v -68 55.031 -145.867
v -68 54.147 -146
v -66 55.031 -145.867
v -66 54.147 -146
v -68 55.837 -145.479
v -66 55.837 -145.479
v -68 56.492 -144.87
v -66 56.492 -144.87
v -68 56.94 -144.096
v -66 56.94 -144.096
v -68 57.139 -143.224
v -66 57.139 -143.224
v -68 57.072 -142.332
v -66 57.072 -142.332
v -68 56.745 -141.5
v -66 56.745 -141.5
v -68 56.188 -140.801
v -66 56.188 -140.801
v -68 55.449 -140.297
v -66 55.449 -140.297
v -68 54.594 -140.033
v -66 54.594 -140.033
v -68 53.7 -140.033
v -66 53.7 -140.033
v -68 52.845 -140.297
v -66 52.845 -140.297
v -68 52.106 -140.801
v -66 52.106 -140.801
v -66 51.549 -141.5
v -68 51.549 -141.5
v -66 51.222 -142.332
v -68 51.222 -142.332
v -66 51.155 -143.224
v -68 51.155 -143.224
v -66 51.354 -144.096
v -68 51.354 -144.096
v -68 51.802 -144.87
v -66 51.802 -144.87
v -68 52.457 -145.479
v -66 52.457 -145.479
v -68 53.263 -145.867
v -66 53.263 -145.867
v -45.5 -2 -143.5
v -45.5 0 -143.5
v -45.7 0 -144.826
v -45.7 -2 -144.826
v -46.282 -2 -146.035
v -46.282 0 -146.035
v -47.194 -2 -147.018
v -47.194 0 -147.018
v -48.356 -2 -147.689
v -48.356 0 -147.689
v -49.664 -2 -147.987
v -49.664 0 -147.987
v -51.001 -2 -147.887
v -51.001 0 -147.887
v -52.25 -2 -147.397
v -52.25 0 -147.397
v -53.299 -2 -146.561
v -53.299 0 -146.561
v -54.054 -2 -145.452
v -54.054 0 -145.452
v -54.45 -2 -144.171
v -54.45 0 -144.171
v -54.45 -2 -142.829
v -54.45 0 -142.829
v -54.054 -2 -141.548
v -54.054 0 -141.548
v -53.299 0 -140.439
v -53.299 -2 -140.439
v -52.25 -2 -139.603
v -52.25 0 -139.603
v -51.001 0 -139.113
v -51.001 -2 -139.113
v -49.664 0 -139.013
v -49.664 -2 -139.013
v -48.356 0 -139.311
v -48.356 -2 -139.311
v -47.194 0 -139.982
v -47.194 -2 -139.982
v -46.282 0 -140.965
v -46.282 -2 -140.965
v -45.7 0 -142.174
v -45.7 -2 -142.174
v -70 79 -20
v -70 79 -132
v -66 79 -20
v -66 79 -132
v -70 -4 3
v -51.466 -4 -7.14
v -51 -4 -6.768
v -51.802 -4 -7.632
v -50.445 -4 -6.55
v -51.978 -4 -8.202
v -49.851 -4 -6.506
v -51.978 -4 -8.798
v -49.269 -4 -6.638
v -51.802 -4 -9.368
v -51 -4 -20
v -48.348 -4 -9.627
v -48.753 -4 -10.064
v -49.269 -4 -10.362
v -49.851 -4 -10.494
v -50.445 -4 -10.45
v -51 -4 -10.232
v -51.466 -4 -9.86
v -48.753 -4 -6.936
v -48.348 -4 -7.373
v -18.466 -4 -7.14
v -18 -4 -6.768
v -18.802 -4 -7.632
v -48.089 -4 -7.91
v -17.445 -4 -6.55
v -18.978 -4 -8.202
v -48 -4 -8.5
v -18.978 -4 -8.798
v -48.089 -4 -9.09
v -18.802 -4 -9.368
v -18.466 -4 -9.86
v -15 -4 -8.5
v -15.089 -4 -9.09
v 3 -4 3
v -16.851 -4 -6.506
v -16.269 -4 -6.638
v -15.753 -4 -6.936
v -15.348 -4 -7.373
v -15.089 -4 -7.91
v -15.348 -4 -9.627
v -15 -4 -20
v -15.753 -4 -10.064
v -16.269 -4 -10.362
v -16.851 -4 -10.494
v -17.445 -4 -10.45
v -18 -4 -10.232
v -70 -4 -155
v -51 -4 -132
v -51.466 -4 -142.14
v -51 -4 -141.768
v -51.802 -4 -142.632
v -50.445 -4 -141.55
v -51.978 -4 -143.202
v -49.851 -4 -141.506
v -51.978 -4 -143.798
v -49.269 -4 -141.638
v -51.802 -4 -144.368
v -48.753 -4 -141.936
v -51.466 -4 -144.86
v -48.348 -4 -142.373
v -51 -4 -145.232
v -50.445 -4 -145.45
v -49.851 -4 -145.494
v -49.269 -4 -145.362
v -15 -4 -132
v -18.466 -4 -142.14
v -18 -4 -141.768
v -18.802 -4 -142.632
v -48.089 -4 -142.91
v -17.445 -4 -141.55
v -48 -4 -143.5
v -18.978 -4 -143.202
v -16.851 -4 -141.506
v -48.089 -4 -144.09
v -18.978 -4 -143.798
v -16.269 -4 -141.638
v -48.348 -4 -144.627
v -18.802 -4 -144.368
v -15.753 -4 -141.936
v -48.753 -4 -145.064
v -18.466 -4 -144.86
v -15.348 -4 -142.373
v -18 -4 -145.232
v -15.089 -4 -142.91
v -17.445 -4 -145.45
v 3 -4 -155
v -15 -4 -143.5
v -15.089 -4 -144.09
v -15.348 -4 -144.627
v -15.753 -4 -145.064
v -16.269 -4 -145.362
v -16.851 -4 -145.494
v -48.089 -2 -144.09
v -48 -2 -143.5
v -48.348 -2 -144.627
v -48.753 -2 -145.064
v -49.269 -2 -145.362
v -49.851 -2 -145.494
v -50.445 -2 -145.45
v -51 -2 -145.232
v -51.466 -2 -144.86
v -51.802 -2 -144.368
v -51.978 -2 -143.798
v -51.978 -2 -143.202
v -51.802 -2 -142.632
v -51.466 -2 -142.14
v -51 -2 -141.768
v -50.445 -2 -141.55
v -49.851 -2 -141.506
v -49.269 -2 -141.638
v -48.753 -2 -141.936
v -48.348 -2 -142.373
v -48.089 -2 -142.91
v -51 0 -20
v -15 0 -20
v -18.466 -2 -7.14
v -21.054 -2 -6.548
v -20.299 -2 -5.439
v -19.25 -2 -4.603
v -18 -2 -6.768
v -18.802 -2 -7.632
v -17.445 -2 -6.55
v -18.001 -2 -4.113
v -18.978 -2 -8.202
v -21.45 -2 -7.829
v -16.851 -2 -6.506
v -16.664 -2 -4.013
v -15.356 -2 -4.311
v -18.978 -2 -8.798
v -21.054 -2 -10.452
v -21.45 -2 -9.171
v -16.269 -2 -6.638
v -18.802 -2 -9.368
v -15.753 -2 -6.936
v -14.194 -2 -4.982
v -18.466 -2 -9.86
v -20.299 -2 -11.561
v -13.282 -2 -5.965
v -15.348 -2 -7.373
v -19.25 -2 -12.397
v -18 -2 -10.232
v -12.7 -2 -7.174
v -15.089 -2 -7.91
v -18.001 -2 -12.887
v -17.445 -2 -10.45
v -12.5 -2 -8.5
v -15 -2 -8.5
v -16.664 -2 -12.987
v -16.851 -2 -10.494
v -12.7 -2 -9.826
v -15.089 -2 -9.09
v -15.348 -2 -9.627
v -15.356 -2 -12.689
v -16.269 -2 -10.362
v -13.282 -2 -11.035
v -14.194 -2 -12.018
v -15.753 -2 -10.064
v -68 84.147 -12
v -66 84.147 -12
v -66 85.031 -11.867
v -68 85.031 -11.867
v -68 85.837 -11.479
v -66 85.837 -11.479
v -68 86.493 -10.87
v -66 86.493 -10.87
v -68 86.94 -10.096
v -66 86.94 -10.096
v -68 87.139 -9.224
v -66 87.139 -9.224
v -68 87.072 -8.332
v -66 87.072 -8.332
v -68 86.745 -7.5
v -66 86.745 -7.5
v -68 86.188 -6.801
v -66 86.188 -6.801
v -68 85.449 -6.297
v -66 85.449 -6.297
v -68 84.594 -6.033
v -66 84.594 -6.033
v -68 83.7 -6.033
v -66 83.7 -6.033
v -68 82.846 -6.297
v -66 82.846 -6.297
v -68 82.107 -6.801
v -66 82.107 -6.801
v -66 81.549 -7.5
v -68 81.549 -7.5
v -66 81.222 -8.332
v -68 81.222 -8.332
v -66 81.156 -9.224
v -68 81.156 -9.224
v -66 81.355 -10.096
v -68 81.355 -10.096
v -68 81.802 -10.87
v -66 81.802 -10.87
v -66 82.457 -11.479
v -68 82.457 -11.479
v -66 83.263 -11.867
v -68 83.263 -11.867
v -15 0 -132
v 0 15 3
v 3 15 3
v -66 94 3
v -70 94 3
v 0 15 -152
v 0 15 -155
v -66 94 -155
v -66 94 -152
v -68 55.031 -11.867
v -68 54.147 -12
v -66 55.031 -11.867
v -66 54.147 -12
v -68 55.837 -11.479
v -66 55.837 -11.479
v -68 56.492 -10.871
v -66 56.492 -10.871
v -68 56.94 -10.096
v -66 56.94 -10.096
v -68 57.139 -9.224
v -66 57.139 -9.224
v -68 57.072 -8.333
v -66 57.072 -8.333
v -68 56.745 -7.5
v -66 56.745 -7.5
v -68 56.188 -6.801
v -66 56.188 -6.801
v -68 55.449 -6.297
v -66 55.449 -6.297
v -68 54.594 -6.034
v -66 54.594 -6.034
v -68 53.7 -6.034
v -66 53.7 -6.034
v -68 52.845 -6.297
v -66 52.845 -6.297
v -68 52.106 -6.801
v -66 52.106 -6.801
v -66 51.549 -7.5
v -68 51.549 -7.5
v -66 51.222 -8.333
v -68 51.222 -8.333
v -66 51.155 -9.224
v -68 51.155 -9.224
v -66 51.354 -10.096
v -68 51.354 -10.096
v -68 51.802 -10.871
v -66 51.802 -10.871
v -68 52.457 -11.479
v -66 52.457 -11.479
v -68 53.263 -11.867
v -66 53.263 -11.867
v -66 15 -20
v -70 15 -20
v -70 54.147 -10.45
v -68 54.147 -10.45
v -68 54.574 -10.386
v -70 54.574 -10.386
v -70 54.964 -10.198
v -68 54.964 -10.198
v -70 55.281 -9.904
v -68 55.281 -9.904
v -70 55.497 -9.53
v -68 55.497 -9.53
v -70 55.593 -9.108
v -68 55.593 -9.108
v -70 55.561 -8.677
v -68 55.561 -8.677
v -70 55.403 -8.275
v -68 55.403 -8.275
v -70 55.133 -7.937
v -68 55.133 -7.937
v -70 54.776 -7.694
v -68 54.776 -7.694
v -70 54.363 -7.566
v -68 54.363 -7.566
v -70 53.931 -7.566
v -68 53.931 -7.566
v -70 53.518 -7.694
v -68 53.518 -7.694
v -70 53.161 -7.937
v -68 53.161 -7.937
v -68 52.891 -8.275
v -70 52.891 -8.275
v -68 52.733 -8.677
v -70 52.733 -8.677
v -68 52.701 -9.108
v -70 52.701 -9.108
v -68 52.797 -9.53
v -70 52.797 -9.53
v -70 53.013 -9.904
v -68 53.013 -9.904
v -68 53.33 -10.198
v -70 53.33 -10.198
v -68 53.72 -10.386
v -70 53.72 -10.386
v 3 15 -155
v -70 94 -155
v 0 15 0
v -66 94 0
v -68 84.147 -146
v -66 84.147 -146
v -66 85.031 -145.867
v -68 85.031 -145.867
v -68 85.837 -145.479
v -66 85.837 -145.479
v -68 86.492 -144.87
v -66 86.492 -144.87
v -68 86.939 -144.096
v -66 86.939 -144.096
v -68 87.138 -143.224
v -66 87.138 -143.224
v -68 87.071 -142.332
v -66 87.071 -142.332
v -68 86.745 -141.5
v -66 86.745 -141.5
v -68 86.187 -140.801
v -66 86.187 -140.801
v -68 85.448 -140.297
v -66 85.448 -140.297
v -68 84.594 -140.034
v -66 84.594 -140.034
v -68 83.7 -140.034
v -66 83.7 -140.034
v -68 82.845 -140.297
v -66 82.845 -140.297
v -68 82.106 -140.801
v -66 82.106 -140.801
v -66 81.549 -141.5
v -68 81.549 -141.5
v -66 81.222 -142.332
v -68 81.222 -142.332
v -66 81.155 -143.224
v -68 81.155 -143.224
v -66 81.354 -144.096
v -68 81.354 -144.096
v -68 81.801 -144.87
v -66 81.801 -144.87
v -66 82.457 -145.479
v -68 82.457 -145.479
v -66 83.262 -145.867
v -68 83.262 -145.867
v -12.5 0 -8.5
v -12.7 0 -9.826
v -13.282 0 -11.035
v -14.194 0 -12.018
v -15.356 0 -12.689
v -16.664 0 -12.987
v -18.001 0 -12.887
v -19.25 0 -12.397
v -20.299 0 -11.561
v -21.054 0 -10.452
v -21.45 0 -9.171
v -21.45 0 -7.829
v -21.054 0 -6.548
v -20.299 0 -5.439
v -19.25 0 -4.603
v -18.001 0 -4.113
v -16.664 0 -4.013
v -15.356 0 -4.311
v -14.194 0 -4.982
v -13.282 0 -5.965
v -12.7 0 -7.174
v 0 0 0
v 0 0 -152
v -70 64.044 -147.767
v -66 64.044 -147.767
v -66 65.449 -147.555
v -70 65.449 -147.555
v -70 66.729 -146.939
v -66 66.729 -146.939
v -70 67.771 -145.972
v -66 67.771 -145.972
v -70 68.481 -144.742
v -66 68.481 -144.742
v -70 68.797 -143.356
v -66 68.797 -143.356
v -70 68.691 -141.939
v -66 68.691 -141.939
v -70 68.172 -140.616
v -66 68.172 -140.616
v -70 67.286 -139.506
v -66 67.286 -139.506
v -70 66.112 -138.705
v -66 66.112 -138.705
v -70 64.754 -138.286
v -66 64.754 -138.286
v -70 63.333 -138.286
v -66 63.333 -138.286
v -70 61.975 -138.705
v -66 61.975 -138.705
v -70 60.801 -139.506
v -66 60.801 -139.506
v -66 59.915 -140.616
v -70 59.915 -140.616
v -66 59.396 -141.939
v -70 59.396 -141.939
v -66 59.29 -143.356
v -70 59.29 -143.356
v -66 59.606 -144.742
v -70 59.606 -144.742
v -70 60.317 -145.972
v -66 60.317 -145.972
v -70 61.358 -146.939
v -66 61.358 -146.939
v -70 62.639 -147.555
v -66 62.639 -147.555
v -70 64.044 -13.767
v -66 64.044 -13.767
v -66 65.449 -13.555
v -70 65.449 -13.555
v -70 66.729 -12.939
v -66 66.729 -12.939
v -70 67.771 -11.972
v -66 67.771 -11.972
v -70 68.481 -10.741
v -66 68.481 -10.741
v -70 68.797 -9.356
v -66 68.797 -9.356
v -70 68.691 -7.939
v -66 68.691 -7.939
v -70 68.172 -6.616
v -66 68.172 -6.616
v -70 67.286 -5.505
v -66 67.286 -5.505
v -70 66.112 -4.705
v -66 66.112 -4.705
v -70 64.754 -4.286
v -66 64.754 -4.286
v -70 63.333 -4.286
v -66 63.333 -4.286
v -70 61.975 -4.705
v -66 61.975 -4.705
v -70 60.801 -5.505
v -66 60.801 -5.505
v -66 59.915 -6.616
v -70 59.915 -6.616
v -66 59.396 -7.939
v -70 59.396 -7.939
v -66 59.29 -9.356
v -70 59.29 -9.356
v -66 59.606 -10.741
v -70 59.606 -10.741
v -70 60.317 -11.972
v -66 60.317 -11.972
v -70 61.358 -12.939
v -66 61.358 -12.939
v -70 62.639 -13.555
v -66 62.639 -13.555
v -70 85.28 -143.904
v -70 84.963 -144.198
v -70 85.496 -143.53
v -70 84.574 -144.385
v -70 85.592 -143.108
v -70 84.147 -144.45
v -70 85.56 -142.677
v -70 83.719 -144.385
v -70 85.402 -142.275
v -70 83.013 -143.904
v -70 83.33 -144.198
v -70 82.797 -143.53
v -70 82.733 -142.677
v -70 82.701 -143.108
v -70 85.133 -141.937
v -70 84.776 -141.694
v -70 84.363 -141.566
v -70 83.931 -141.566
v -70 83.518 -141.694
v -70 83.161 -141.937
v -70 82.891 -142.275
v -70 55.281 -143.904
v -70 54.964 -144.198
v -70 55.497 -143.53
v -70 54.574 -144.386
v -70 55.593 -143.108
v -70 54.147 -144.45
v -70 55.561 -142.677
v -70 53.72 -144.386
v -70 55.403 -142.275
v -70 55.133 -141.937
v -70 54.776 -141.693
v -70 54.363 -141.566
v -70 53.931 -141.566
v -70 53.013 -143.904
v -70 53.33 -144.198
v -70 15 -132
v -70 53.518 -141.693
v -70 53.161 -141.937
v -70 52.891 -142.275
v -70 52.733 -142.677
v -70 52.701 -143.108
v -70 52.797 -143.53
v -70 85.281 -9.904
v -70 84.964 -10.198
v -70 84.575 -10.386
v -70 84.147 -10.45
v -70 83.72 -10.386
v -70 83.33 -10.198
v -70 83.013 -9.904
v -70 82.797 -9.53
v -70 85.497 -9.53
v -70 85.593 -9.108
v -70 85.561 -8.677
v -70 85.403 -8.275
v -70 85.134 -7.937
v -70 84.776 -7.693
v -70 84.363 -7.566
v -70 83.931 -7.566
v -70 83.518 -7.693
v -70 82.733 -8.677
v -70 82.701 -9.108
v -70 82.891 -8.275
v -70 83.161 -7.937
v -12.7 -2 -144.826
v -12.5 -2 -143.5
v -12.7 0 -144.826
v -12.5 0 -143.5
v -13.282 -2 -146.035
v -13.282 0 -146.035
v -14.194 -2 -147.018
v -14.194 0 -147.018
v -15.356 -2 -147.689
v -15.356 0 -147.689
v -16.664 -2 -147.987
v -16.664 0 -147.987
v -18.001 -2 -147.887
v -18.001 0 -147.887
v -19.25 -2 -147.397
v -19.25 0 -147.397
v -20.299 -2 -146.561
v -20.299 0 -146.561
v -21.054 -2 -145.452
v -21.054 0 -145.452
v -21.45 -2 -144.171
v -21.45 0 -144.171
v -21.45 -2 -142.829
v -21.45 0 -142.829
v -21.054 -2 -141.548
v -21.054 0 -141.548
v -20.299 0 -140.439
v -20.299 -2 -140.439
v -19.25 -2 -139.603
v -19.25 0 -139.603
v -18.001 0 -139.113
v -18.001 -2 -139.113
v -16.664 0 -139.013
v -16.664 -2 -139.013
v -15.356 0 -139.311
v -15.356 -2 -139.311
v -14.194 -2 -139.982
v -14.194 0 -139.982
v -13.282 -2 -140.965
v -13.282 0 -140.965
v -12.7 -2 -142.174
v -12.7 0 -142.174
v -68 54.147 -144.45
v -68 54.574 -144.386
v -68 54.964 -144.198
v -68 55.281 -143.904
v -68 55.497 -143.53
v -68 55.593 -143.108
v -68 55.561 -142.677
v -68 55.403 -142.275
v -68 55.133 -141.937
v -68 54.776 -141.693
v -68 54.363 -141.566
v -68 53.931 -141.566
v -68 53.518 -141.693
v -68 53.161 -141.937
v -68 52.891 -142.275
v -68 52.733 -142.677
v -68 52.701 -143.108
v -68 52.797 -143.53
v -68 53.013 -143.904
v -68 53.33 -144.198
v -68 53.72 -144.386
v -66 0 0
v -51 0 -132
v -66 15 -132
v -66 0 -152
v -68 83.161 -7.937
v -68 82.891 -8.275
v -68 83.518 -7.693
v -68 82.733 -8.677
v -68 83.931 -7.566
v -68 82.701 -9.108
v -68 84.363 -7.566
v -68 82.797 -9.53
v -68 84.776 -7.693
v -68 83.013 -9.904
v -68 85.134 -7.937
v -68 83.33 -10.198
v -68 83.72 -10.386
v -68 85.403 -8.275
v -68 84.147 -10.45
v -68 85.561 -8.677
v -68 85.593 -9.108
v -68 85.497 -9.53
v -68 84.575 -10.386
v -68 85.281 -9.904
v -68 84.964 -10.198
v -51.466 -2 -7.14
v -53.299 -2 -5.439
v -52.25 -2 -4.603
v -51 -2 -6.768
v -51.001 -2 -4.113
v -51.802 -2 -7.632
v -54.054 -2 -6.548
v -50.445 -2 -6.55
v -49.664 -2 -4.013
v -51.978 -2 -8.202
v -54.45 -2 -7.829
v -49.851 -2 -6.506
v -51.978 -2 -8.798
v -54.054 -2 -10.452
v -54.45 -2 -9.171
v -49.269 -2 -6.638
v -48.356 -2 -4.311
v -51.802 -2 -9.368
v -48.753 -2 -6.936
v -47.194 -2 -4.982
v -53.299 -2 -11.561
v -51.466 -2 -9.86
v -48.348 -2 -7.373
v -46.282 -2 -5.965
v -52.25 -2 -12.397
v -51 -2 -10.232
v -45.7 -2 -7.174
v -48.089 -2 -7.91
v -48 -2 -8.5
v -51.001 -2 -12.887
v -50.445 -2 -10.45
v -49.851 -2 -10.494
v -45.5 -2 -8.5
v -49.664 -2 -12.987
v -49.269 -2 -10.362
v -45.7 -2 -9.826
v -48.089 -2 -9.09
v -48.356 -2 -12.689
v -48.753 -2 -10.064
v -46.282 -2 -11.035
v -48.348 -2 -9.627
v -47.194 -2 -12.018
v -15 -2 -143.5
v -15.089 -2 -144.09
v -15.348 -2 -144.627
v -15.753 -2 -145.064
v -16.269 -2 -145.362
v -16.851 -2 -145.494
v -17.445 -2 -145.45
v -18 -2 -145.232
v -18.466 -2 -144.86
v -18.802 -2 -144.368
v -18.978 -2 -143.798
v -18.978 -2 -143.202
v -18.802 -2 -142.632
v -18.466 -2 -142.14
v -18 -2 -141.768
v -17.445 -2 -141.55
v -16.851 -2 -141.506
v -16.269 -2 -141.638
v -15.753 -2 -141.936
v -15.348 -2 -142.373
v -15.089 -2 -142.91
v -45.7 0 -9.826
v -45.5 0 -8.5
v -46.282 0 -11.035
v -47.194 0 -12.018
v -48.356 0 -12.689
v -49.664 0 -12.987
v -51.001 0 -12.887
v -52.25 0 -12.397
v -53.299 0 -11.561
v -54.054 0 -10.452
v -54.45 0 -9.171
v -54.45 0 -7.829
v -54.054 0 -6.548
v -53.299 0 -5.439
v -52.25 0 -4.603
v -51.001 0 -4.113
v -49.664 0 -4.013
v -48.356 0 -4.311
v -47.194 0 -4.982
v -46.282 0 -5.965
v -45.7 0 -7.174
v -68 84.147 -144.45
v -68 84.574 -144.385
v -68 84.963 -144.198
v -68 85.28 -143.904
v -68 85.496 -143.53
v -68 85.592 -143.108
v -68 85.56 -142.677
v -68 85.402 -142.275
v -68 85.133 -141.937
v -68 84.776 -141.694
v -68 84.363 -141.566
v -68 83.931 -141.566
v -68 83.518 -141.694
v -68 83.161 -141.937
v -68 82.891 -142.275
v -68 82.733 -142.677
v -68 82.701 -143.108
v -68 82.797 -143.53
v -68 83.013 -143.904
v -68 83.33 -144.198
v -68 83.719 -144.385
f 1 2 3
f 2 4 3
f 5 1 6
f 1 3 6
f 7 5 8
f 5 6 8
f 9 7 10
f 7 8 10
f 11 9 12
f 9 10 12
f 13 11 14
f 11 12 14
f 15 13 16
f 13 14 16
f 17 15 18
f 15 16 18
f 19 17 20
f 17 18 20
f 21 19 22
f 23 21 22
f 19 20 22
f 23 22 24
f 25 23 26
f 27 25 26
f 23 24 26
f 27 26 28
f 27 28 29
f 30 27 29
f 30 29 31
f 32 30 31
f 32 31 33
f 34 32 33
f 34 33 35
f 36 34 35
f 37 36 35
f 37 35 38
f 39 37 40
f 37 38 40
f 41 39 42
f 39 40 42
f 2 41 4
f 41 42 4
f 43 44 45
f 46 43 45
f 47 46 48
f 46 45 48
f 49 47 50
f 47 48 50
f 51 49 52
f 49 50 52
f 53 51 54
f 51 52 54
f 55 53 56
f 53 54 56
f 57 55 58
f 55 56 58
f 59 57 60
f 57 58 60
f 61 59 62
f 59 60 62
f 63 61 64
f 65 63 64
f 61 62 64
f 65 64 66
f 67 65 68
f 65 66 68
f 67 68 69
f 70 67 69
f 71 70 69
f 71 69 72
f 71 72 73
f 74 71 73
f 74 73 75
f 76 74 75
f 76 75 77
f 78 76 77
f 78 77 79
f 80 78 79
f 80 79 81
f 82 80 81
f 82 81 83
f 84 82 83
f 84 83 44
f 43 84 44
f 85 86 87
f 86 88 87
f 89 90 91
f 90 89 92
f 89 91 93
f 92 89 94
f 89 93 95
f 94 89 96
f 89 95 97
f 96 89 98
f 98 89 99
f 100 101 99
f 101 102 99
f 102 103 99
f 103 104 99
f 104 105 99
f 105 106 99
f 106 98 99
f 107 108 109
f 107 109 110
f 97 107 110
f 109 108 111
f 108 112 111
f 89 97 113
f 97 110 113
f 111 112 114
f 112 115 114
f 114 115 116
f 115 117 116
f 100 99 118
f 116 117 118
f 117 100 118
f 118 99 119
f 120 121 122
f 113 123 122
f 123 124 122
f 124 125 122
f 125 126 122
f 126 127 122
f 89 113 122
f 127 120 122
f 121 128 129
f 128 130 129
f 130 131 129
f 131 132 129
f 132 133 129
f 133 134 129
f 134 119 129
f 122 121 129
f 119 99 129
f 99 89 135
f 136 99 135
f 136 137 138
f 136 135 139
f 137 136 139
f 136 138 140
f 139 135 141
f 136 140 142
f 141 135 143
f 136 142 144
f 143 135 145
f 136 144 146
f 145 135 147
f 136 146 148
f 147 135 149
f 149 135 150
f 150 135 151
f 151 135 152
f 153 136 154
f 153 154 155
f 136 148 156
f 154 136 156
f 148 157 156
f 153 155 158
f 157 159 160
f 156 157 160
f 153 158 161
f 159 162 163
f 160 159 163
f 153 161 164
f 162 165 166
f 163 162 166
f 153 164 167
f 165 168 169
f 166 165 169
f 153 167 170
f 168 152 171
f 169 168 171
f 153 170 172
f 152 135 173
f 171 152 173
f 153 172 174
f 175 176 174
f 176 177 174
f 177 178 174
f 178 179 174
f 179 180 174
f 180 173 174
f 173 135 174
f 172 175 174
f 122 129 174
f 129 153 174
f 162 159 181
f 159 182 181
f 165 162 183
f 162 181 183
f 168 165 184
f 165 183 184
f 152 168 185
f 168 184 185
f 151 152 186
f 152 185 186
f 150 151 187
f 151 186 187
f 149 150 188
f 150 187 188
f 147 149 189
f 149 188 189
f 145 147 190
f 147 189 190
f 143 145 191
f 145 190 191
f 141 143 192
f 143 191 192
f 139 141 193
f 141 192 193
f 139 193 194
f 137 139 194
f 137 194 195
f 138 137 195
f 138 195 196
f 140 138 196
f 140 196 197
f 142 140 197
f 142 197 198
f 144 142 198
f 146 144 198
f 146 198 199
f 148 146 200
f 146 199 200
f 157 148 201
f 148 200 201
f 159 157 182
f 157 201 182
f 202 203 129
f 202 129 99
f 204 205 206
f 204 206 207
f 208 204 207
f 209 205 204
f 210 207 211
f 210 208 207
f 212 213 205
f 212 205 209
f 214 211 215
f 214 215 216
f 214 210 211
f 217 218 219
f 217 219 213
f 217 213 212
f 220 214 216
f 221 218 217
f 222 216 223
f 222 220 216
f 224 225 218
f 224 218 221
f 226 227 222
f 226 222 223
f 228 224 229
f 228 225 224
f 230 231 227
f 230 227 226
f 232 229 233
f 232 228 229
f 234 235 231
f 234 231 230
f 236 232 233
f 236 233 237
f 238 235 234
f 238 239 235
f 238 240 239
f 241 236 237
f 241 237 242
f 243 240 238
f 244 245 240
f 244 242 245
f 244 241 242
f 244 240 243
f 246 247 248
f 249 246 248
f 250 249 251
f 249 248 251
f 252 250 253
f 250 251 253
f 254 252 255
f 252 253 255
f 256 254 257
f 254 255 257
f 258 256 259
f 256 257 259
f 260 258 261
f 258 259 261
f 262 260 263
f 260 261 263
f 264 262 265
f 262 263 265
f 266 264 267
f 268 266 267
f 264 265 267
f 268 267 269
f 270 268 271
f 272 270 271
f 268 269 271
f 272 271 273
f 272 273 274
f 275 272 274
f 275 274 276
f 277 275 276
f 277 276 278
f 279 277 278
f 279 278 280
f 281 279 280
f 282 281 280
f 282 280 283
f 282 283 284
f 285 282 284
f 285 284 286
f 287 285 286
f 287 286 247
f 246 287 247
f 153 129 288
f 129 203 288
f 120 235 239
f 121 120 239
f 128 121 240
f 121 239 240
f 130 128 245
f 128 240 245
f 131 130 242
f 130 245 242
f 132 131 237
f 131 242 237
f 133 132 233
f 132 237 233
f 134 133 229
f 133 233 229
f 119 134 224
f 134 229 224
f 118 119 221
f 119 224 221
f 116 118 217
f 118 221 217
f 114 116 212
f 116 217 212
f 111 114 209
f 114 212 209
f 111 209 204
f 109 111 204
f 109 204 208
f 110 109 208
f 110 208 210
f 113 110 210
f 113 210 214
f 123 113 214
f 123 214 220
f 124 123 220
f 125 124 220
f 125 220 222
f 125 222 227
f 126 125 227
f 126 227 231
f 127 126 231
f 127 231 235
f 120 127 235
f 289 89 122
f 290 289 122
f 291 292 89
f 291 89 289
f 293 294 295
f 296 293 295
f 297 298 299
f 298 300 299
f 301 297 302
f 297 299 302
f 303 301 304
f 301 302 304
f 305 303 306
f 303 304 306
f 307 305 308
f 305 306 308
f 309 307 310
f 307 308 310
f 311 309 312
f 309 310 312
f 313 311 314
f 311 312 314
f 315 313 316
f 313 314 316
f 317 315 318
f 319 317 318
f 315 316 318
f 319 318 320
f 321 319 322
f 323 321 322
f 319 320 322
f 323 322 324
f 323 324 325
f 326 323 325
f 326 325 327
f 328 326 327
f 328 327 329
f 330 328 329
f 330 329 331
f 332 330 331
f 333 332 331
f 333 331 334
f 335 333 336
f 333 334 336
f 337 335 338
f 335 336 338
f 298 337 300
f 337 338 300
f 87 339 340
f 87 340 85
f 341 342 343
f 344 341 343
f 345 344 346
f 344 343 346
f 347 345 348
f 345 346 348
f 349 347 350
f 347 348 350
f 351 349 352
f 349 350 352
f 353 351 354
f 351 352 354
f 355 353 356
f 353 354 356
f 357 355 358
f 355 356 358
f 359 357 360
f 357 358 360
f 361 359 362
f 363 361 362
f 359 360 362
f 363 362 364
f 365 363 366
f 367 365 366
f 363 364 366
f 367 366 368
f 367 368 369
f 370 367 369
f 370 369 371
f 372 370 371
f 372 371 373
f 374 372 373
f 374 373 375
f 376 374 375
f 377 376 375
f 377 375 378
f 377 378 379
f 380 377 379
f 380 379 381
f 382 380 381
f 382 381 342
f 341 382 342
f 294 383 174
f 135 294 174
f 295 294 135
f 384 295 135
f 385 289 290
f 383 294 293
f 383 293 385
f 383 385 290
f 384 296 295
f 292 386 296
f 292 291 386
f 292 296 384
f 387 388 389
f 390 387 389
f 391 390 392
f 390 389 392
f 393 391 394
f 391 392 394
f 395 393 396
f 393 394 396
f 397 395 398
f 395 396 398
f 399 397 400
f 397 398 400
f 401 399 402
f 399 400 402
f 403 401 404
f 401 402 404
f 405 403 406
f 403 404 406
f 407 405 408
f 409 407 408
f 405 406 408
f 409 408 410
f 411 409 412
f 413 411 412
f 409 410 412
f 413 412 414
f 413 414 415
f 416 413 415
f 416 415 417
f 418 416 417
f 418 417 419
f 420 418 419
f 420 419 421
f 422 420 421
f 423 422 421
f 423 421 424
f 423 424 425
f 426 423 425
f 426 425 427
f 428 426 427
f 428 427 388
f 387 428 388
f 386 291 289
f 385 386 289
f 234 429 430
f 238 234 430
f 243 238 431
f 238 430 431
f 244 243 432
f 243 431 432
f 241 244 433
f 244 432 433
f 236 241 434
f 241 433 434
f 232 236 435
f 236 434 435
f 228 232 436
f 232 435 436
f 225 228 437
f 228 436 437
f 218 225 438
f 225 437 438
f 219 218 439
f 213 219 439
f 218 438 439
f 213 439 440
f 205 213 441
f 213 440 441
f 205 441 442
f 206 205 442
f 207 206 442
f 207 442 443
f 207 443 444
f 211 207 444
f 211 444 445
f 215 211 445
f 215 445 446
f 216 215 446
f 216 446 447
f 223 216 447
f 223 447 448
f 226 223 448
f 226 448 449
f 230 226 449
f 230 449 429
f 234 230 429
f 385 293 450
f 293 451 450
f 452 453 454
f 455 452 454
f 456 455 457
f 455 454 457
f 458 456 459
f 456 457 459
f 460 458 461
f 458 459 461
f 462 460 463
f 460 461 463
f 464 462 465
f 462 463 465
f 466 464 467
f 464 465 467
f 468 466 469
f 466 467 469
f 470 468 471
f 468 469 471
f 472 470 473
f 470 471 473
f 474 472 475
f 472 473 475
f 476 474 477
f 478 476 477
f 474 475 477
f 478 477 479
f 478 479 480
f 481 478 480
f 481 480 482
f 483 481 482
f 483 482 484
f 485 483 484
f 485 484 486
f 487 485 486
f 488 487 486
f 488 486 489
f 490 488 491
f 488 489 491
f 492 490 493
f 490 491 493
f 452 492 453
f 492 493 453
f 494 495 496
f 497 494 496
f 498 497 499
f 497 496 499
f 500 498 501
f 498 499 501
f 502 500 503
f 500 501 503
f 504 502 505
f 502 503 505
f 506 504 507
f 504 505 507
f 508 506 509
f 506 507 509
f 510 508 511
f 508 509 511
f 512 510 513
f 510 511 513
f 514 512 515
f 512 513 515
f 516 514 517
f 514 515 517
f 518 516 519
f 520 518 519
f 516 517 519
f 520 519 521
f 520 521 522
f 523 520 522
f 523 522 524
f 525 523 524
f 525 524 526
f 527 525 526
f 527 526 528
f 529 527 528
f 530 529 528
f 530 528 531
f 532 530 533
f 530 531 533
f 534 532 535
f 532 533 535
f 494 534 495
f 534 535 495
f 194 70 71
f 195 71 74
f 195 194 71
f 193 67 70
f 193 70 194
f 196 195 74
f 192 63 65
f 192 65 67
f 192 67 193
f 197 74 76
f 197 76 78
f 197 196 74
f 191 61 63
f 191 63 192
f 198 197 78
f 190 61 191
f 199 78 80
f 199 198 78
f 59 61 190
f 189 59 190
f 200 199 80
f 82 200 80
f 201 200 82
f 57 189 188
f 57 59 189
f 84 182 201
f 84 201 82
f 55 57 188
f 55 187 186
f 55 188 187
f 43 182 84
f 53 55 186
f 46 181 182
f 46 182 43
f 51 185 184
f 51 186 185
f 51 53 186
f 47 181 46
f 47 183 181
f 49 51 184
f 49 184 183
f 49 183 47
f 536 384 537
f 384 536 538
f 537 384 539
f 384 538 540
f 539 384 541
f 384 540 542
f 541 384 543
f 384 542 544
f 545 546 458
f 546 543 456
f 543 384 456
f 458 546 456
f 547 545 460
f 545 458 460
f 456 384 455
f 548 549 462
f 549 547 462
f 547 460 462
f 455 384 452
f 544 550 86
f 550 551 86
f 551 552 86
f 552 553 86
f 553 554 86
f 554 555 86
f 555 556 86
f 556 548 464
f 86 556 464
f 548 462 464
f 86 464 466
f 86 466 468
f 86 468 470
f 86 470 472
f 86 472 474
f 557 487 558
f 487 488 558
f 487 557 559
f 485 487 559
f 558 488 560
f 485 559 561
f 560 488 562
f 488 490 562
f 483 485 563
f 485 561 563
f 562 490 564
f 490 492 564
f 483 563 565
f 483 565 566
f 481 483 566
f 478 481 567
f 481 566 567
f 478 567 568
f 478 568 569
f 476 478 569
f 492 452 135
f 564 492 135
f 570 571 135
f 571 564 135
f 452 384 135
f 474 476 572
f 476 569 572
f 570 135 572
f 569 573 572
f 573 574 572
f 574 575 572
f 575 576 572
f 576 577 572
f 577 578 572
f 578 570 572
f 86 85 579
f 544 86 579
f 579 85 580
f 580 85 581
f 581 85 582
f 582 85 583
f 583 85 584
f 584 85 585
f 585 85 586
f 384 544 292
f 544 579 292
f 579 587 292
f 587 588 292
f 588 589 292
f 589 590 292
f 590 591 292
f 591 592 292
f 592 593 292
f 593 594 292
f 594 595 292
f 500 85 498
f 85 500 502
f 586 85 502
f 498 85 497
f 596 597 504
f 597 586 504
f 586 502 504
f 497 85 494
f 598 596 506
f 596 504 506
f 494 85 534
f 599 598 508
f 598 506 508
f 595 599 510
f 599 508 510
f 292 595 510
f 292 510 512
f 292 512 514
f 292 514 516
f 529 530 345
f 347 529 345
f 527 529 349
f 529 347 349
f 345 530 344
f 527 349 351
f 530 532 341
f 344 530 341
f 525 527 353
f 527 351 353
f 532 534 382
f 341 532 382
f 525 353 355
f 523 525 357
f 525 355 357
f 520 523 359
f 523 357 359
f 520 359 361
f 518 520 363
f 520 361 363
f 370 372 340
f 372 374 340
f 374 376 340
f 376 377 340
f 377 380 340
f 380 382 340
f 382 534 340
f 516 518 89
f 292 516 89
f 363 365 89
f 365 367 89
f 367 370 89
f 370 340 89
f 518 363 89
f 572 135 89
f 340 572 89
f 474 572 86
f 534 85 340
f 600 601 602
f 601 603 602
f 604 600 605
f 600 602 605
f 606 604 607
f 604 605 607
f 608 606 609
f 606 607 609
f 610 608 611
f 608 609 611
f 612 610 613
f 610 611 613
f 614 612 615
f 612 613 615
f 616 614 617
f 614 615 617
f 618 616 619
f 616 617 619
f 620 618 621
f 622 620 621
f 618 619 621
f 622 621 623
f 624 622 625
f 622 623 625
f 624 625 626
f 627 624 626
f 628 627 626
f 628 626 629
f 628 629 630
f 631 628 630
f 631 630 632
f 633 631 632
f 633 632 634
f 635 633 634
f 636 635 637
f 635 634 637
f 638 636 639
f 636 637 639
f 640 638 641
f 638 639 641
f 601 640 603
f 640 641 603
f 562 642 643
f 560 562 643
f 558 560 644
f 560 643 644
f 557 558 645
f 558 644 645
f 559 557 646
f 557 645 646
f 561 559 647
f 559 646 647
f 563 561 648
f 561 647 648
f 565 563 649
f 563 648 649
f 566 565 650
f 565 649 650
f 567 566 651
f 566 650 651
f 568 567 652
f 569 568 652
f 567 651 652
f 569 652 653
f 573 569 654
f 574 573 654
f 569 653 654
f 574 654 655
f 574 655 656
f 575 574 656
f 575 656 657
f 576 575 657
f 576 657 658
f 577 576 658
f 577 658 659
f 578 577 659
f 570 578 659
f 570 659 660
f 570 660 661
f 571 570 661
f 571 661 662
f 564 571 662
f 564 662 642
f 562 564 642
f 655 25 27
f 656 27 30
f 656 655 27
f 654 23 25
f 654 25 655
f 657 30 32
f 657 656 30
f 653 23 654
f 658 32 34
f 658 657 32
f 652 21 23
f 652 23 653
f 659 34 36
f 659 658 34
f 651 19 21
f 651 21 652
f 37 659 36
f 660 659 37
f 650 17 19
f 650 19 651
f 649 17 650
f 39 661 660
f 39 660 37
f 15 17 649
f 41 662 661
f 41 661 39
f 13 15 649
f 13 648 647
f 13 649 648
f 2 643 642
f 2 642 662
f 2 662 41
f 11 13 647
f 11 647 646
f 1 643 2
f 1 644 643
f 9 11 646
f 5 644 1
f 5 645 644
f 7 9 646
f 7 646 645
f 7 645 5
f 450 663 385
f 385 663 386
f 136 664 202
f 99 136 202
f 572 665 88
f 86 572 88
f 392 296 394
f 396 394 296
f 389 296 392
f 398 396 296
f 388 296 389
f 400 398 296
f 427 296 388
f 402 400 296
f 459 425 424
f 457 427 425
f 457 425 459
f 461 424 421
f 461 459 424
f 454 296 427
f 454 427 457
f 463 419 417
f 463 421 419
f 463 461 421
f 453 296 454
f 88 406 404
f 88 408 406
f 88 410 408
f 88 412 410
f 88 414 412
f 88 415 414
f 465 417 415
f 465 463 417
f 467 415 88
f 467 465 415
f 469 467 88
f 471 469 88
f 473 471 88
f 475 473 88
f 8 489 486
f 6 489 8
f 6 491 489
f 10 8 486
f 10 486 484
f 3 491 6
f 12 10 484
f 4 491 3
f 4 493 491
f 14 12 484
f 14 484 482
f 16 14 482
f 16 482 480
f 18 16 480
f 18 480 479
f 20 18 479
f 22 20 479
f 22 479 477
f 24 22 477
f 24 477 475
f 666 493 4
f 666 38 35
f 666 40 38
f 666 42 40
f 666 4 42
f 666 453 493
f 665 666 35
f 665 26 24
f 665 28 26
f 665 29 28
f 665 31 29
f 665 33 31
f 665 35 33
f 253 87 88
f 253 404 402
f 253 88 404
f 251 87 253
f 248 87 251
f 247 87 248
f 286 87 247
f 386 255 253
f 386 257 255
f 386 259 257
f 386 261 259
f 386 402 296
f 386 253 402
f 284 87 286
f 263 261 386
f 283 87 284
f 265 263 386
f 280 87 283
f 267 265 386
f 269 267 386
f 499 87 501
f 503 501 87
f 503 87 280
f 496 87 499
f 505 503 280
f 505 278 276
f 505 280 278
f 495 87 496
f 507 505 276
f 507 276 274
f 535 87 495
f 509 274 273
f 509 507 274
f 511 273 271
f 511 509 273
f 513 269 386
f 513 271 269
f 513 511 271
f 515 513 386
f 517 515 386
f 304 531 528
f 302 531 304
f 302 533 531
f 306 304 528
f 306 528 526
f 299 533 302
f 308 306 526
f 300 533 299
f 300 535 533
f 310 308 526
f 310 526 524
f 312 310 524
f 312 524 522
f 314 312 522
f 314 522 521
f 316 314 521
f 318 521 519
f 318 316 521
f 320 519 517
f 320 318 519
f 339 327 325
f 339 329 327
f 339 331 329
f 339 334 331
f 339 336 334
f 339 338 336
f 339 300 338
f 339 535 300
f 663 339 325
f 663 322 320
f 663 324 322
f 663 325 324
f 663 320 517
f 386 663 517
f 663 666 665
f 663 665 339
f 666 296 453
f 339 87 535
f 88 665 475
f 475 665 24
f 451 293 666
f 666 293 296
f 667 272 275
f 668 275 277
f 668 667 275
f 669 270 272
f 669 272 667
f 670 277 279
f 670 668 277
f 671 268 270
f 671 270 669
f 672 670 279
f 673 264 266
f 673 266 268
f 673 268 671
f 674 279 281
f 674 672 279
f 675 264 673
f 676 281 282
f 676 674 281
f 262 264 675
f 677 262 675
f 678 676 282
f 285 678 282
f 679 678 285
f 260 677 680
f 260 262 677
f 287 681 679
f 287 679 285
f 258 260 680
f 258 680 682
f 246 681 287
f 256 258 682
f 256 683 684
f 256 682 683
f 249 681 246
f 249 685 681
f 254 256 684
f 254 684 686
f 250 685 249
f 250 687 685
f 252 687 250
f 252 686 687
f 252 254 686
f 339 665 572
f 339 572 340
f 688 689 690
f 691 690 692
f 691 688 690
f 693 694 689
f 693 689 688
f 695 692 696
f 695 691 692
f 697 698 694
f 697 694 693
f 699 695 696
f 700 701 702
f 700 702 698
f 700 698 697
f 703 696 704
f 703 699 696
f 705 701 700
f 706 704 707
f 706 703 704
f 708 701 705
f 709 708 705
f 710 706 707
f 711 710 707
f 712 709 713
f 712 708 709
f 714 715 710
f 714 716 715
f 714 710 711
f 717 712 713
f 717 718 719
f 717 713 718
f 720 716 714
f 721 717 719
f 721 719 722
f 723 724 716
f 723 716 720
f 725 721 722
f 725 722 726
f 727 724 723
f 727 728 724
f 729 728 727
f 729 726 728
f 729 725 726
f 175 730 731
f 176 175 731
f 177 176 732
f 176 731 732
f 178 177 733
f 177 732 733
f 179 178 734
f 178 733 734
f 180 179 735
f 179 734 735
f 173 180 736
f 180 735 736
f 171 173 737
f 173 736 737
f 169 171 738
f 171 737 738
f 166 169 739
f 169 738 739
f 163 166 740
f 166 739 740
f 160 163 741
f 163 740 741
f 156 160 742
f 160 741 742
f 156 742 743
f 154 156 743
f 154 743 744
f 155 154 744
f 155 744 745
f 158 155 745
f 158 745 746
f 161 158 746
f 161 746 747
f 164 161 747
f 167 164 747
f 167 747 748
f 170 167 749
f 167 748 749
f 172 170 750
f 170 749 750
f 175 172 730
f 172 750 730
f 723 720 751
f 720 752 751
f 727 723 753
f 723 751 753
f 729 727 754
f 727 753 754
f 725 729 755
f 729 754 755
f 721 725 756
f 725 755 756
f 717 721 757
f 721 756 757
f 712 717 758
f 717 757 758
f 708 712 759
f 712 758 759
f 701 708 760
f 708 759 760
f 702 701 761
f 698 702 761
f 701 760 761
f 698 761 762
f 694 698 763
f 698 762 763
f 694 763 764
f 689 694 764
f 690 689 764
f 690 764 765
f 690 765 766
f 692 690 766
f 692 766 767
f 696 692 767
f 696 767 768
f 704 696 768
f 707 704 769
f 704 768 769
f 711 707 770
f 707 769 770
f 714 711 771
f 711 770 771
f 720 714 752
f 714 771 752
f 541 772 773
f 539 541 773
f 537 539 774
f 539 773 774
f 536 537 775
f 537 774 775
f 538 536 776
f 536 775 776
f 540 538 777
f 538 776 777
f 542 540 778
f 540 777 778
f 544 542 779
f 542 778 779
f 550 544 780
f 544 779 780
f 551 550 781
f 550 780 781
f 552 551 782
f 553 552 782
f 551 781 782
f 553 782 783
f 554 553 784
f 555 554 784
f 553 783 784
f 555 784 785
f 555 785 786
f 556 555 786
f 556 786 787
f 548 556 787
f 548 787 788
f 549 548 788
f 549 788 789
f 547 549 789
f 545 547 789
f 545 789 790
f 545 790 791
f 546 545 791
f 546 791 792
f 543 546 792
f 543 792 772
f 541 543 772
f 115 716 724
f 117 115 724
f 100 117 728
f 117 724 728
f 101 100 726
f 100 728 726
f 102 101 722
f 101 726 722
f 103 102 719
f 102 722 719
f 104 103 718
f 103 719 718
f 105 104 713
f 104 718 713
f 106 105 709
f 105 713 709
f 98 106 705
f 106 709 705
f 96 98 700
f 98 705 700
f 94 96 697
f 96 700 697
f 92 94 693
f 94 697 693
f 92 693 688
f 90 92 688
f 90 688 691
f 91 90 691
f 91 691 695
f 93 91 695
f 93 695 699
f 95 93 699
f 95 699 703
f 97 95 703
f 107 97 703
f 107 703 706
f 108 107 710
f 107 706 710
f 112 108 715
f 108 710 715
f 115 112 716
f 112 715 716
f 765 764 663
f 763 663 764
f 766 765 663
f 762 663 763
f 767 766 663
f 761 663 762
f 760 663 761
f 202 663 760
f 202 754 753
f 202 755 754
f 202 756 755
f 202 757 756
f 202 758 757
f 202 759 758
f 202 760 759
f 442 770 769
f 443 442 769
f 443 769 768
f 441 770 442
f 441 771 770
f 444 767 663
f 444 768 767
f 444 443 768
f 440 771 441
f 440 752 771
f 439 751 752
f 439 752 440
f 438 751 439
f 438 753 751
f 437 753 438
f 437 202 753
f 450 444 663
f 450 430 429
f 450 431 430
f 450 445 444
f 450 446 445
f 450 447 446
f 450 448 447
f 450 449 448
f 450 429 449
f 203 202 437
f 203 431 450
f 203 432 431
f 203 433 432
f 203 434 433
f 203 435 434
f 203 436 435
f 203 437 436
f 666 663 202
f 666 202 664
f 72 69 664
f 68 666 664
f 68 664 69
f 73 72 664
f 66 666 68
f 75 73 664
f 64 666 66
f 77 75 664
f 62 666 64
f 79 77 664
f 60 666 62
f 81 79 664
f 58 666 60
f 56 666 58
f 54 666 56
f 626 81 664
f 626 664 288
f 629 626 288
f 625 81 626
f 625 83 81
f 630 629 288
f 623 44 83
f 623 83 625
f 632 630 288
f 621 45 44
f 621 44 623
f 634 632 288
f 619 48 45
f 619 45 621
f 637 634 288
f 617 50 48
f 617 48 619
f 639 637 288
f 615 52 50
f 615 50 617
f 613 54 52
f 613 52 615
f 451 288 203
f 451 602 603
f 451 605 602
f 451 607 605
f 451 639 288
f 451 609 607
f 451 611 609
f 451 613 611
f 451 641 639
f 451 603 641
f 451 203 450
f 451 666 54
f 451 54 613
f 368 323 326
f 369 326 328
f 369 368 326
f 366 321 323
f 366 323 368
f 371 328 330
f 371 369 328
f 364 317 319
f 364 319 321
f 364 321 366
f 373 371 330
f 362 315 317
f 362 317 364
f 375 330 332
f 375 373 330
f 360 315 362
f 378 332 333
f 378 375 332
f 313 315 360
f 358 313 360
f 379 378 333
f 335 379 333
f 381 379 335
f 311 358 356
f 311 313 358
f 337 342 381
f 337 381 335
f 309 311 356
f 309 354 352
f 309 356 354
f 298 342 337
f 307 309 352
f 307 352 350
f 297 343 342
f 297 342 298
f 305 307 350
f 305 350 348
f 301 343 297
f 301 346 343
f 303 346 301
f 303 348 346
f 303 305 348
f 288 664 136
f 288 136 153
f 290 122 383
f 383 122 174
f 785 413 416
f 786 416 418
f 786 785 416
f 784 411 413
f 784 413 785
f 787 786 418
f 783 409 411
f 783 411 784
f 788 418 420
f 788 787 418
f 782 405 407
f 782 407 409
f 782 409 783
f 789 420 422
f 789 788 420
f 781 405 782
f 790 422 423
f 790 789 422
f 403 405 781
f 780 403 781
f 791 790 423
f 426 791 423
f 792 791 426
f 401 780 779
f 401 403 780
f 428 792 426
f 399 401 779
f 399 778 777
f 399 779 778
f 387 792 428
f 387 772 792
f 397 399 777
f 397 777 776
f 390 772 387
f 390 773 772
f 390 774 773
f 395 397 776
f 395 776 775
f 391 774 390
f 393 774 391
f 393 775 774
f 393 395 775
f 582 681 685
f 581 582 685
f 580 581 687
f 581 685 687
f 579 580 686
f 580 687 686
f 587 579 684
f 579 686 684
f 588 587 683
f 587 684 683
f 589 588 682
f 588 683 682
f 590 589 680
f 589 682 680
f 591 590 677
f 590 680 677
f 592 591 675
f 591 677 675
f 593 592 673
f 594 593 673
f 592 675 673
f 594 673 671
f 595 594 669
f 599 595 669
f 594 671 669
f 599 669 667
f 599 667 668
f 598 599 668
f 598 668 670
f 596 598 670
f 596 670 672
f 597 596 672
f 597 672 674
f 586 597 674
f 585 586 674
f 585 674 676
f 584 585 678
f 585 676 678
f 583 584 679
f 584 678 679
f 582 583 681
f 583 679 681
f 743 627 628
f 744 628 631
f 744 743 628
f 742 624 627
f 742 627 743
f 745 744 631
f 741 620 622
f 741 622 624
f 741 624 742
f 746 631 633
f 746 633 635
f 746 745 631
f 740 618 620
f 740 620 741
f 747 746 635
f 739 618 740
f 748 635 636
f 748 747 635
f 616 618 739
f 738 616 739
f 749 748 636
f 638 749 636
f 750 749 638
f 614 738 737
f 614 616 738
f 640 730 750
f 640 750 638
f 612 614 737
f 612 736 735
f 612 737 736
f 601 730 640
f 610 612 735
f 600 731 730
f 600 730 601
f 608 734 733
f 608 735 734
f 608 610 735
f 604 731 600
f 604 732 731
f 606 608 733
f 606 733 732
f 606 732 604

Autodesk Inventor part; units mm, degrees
ref_plane "YZ Plane" through (0, 0, 0) normal (1, 0, 0) x (0, 1, 0)
ref_plane "XZ Plane" through (0, 0, 0) normal (0, 1, 0) x (-1, 0, 0)
ref_plane "XY Plane" through (0, 0, 0) normal (0, 0, 1) x (1, 0, 0)
sketch "Sketch1" plane through (0, 0, 0) normal (0, 1, 0) x (-1, 0, 0)
  line L0 (0, 0) -> (0, -152)
  line L1 (0, -152) -> (66, -152)
  line L2 (66, -152) -> (66, 0)
  line L3 (66, 0) -> (0, 0)
  line L4 (66, 0) -> (66, 3)
  line L5 (66, 3) -> (0, 3)
  line L6 (0, 3) -> (0, 0)
  line L7 (66, -152) -> (66, -155)
  line L8 (66, -155) -> (0, -155)
  line L9 (0, -155) -> (0, -152)
  line L10 (66, -155) -> (70, -155)
  line L11 (70, -155) -> (70, 3)
  line L12 (70, 3) -> (66, 3)
  dimension "d0" = 152
  dimension "d1" = 66
  dimension "d2" = 3
  dimension "d3" = 3
  dimension "d4" = 4
extrude "Extrusion1" add sketch "Sketch1" against normal blind 4
extrude "Extrusion2" add sketch "Sketch1" along normal blind 94 contours L4 L12 L11 L10 L7 L2
sketch "Sketch7" plane through (0, 0, 0) normal (0, 1, 0) x (1, 0, 0)
  line L0 (0, 155) -> (0, -3) projected
  line L1 (0, -3) -> (3, -3)
  line L2 (3, -3) -> (3, 155)
  line L3 (3, 155) -> (0, 155)
  line L4 (0, 155) -> (0, -3)
  point P0 (0, 0)
  dimension "d15" = 3
extrude "Extrusion3" add sketch "Sketch7" against normal up to surface (4 mm away)
extrude "Extrusion4" add sketch "Sketch7" along normal blind 15
sketch "Sketch8" plane through (-66, 94, -155) normal (0, 0, -1) x (-1, 0, 0)
  line L0 (-66, -79) -> (0, 0)
  line L1 (0, -94) -> (0, 0) projected
  line L2 (0, 0) -> (0, -94)
  line L3 (-66, -94) -> (0, -94) projected
  line L4 (0, -94) -> (-66, -94)
  line L5 (-66, -94) -> (-66, -79)
extrude "Extrusion5" add sketch "Sketch8" against normal blind 3
sketch "Sketch9" plane through (-70, 94, 3) normal (0, 0, 1) x (1, 0, 0)
  line L0 (0, 0) -> (4, 0) projected
  line L1 (70, -94) -> (70, -79) projected
  line L2 (4, 0) -> (70, -79)
  line L3 (70, -79) -> (70, -94)
  line L4 (4, -94) -> (70, -94) projected
  line L5 (70, -94) -> (4, -94)
  line L6 (4, -94) -> (4, 0) projected
  line L7 (4, -94) -> (4, 0)
extrude "Extrusion6" add sketch "Sketch9" against normal blind 3
sketch "Sketch10" plane through (0, 0, 0) normal (0, 1, 0) x (1, 0, 0)
  line L0 (-66, 0) -> (-66, 152) projected
  line L1 (-66, 0) -> (-66, 20)
  line L2 (-66, 20) -> (-51, 20)
  line L3 (-66, 0) -> (0, 0) projected
  line L4 (0, 0) -> (0, 20)
  line L5 (0, 152) -> (0, 0) projected
  line L6 (0, 20) -> (-15, 20)
  line L7 (0, 152) -> (0, 132)
  line L8 (0, 132) -> (-15, 132)
  line L9 (0, 152) -> (-66, 152) projected
  line L10 (-66, 152) -> (-66, 132)
  line L11 (-66, 132) -> (-51, 132)
  line L12 (-51, 132) -> (-51, 20)
  line L13 (-15, 20) -> (-51, 20)
  line L14 (-15, 20) -> (-15, 132)
  line L15 (-51, 132) -> (-15, 132)
  dimension "d24" = 20
  dimension "d25" = 15
  dimension "d26" = 20
  dimension "d27" = 15
  dimension "d28" = 20
  dimension "d29" = 20
  dimension "d30" = 15
extrude "Extrusion7" cut sketch "Sketch10" against normal up to surface (4 mm away) contours L12 L15 L14 L13
sketch "Sketch11" plane through (-66, 0, -152) normal (1, 0, 0) x (0, 0, -1)
  line L0 (-152, 94) -> (0, 94) projected
  line L1 (-152, 94) -> (-132, 94)
  line L2 (-132, 94) -> (-132, 79)
  line L3 (0, 94) -> (-20, 94)
  line L4 (-20, 94) -> (-20, 79)
  line L5 (-20, 79) -> (-132, 79)
  line L6 (0, 0) -> (-152, 0) projected
  line L7 (-152, 0) -> (-132, 0)
  line L8 (-132, 0) -> (-132, 15)
  line L9 (-132, 15) -> (-132, 79)
  line L10 (0, 0) -> (-20, 0)
  line L11 (-20, 0) -> (-20, 15)
  line L12 (-20, 15) -> (-20, 79)
  line L13 (-20, 15) -> (-132, 15)
  dimension "d33" = 20
  dimension "d34" = 15
  dimension "d35" = 20
  dimension "d36" = 15
  dimension "d37" = 20
  dimension "d38" = 15
  dimension "d39" = 20
  dimension "d40" = 15
extrude "Extrusion8" cut sketch "Sketch11" against normal up to surface (4 mm away) contours L5 L12 L13 L9
sketch "Sketch12" plane through (0, 0, 0) normal (0, 1, 0) x (1, 0, 0)
  line L0 (-70, -3) -> (3, -3) projected
  line L1 (3, -3) -> (3, 20)
  line L2 (3, -3) -> (3, 155) projected
  line L3 (3, -3) -> (3, 8.5)
  line L4 (3, 8.5) -> (-70, 8.5)
  line L5 (3, 8.5) -> (-17, 8.5)
  line L6 (-70, 8.5) -> (-50, 8.5)
  circle A0 centre (-17, 8.5) radius 2
  circle A1 centre (-50, 8.5) radius 2
  line L7 (-70, 155) -> (3, 155) projected
  line L8 (3, 155) -> (3, 143.5)
  line L9 (3, 143.5) -> (-70, 143.5)
  line L10 (-70, 155) -> (-70, -3) projected
  line L11 (3, 143.5) -> (-17, 143.5)
  line L12 (-70, 143.5) -> (-50, 143.5)
  circle A2 centre (-17, 143.5) radius 2
  circle A3 centre (-50, 143.5) radius 2
  dimension "d43" = 23
  dimension "d44" = 11.5
  dimension "d45" = 20
  dimension "d46" = 20
  dimension "d47" = 4
  dimension "d48" = 4
  dimension "d49" = 11.5
  dimension "d50" = 20
  dimension "d51" = 20
  dimension "d52" = 4
  dimension "d53" = 4
extrude "Extrusion9" cut sketch "Sketch12" against normal up to surface (4 mm away) contours A1 L4 | L4 A1 | A0 L4 | L4 A0 | A3 L9 | L9 A3 | A2 L9 | L9 A2
sketch "Sketch13" plane through (-66, 0, -152) normal (1, 0, 0) x (0, 0, -1)
  circle A0 centre (-143.0001, 84.1472) radius 1.4502 projected
  circle A1 centre (-142.9999, 54.147) radius 1.4501 projected
  circle A2 centre (-9, 84.1467) radius 1.4497 projected
  circle A3 centre (-9.0001, 54.147) radius 1.4501 projected
  point P0 (-152, 0)
extrude "Extrusion10" cut sketch "Sketch13" against normal up to surface (4 mm away)
sketch "Sketch14" plane through (-66, 0, -152) normal (1, 0, 0) x (0, 0, -1)
  circle A0 centre (-9, 84.1467) radius 1.4497 projected
  line L0 (-9, 84.1467) -> (-9, 64.0437)
  circle A1 centre (-9, 64.0437) radius 4.767
  circle A2 centre (-143.0001, 84.1472) radius 1.4502 projected
  line L1 (-143.0001, 84.1472) -> (-143.0001, 64.0437)
  circle A3 centre (-143.0001, 64.0437) radius 4.767
  point P0 (-152, 0)
  dimension "d58" = 20.103
  dimension "d59" = 9.534
extrude "Extrusion11" cut sketch "Sketch14" against normal up to surface (4 mm away) contours A1 | A3
sketch "Sketch15" plane through (0, 0, 0) normal (0, 1, 0) x (1, 0, 0)
  circle A0 centre (-50, 8.5) radius 2 projected
  circle A1 centre (-50, 8.5) radius 4.5
  circle A2 centre (-17, 8.5) radius 2 projected
  circle A3 centre (-17, 8.5) radius 4.5
  circle A4 centre (-50, 143.5) radius 2 projected
  circle A5 centre (-50, 143.5) radius 4.5
  circle A6 centre (-17, 143.5) radius 2 projected
  circle A7 centre (-17, 143.5) radius 4.5
  point P0 (0, 0)
  dimension "d68" = 9
  dimension "d69" = 9
  dimension "d70" = 9
  dimension "d71" = 9
extrude "Extrusion12" cut sketch "Sketch15" against normal blind 2
sketch "Sketch16" plane through (-66, 0, -152) normal (1, 0, 0) x (0, 0, -1)
  circle A0 centre (-143.0001, 84.1472) radius 1.4502 projected
  circle A1 centre (-143.0001, 84.1472) radius 3
  circle A2 centre (-142.9999, 54.147) radius 1.4501 projected
  circle A3 centre (-142.9999, 54.147) radius 3
  circle A4 centre (-9, 84.1467) radius 1.4497 projected
  circle A5 centre (-9, 84.1467) radius 3
  circle A6 centre (-9.0001, 54.147) radius 1.4501 projected
  circle A7 centre (-9.0001, 54.147) radius 3
  point P0 (-152, 0)
  dimension "d74" = 6
  dimension "d75" = 6
  dimension "d76" = 6
  dimension "d77" = 6
extrude "Extrusion13" cut sketch "Sketch16" against normal blind 2
properties part number "battery_box"
